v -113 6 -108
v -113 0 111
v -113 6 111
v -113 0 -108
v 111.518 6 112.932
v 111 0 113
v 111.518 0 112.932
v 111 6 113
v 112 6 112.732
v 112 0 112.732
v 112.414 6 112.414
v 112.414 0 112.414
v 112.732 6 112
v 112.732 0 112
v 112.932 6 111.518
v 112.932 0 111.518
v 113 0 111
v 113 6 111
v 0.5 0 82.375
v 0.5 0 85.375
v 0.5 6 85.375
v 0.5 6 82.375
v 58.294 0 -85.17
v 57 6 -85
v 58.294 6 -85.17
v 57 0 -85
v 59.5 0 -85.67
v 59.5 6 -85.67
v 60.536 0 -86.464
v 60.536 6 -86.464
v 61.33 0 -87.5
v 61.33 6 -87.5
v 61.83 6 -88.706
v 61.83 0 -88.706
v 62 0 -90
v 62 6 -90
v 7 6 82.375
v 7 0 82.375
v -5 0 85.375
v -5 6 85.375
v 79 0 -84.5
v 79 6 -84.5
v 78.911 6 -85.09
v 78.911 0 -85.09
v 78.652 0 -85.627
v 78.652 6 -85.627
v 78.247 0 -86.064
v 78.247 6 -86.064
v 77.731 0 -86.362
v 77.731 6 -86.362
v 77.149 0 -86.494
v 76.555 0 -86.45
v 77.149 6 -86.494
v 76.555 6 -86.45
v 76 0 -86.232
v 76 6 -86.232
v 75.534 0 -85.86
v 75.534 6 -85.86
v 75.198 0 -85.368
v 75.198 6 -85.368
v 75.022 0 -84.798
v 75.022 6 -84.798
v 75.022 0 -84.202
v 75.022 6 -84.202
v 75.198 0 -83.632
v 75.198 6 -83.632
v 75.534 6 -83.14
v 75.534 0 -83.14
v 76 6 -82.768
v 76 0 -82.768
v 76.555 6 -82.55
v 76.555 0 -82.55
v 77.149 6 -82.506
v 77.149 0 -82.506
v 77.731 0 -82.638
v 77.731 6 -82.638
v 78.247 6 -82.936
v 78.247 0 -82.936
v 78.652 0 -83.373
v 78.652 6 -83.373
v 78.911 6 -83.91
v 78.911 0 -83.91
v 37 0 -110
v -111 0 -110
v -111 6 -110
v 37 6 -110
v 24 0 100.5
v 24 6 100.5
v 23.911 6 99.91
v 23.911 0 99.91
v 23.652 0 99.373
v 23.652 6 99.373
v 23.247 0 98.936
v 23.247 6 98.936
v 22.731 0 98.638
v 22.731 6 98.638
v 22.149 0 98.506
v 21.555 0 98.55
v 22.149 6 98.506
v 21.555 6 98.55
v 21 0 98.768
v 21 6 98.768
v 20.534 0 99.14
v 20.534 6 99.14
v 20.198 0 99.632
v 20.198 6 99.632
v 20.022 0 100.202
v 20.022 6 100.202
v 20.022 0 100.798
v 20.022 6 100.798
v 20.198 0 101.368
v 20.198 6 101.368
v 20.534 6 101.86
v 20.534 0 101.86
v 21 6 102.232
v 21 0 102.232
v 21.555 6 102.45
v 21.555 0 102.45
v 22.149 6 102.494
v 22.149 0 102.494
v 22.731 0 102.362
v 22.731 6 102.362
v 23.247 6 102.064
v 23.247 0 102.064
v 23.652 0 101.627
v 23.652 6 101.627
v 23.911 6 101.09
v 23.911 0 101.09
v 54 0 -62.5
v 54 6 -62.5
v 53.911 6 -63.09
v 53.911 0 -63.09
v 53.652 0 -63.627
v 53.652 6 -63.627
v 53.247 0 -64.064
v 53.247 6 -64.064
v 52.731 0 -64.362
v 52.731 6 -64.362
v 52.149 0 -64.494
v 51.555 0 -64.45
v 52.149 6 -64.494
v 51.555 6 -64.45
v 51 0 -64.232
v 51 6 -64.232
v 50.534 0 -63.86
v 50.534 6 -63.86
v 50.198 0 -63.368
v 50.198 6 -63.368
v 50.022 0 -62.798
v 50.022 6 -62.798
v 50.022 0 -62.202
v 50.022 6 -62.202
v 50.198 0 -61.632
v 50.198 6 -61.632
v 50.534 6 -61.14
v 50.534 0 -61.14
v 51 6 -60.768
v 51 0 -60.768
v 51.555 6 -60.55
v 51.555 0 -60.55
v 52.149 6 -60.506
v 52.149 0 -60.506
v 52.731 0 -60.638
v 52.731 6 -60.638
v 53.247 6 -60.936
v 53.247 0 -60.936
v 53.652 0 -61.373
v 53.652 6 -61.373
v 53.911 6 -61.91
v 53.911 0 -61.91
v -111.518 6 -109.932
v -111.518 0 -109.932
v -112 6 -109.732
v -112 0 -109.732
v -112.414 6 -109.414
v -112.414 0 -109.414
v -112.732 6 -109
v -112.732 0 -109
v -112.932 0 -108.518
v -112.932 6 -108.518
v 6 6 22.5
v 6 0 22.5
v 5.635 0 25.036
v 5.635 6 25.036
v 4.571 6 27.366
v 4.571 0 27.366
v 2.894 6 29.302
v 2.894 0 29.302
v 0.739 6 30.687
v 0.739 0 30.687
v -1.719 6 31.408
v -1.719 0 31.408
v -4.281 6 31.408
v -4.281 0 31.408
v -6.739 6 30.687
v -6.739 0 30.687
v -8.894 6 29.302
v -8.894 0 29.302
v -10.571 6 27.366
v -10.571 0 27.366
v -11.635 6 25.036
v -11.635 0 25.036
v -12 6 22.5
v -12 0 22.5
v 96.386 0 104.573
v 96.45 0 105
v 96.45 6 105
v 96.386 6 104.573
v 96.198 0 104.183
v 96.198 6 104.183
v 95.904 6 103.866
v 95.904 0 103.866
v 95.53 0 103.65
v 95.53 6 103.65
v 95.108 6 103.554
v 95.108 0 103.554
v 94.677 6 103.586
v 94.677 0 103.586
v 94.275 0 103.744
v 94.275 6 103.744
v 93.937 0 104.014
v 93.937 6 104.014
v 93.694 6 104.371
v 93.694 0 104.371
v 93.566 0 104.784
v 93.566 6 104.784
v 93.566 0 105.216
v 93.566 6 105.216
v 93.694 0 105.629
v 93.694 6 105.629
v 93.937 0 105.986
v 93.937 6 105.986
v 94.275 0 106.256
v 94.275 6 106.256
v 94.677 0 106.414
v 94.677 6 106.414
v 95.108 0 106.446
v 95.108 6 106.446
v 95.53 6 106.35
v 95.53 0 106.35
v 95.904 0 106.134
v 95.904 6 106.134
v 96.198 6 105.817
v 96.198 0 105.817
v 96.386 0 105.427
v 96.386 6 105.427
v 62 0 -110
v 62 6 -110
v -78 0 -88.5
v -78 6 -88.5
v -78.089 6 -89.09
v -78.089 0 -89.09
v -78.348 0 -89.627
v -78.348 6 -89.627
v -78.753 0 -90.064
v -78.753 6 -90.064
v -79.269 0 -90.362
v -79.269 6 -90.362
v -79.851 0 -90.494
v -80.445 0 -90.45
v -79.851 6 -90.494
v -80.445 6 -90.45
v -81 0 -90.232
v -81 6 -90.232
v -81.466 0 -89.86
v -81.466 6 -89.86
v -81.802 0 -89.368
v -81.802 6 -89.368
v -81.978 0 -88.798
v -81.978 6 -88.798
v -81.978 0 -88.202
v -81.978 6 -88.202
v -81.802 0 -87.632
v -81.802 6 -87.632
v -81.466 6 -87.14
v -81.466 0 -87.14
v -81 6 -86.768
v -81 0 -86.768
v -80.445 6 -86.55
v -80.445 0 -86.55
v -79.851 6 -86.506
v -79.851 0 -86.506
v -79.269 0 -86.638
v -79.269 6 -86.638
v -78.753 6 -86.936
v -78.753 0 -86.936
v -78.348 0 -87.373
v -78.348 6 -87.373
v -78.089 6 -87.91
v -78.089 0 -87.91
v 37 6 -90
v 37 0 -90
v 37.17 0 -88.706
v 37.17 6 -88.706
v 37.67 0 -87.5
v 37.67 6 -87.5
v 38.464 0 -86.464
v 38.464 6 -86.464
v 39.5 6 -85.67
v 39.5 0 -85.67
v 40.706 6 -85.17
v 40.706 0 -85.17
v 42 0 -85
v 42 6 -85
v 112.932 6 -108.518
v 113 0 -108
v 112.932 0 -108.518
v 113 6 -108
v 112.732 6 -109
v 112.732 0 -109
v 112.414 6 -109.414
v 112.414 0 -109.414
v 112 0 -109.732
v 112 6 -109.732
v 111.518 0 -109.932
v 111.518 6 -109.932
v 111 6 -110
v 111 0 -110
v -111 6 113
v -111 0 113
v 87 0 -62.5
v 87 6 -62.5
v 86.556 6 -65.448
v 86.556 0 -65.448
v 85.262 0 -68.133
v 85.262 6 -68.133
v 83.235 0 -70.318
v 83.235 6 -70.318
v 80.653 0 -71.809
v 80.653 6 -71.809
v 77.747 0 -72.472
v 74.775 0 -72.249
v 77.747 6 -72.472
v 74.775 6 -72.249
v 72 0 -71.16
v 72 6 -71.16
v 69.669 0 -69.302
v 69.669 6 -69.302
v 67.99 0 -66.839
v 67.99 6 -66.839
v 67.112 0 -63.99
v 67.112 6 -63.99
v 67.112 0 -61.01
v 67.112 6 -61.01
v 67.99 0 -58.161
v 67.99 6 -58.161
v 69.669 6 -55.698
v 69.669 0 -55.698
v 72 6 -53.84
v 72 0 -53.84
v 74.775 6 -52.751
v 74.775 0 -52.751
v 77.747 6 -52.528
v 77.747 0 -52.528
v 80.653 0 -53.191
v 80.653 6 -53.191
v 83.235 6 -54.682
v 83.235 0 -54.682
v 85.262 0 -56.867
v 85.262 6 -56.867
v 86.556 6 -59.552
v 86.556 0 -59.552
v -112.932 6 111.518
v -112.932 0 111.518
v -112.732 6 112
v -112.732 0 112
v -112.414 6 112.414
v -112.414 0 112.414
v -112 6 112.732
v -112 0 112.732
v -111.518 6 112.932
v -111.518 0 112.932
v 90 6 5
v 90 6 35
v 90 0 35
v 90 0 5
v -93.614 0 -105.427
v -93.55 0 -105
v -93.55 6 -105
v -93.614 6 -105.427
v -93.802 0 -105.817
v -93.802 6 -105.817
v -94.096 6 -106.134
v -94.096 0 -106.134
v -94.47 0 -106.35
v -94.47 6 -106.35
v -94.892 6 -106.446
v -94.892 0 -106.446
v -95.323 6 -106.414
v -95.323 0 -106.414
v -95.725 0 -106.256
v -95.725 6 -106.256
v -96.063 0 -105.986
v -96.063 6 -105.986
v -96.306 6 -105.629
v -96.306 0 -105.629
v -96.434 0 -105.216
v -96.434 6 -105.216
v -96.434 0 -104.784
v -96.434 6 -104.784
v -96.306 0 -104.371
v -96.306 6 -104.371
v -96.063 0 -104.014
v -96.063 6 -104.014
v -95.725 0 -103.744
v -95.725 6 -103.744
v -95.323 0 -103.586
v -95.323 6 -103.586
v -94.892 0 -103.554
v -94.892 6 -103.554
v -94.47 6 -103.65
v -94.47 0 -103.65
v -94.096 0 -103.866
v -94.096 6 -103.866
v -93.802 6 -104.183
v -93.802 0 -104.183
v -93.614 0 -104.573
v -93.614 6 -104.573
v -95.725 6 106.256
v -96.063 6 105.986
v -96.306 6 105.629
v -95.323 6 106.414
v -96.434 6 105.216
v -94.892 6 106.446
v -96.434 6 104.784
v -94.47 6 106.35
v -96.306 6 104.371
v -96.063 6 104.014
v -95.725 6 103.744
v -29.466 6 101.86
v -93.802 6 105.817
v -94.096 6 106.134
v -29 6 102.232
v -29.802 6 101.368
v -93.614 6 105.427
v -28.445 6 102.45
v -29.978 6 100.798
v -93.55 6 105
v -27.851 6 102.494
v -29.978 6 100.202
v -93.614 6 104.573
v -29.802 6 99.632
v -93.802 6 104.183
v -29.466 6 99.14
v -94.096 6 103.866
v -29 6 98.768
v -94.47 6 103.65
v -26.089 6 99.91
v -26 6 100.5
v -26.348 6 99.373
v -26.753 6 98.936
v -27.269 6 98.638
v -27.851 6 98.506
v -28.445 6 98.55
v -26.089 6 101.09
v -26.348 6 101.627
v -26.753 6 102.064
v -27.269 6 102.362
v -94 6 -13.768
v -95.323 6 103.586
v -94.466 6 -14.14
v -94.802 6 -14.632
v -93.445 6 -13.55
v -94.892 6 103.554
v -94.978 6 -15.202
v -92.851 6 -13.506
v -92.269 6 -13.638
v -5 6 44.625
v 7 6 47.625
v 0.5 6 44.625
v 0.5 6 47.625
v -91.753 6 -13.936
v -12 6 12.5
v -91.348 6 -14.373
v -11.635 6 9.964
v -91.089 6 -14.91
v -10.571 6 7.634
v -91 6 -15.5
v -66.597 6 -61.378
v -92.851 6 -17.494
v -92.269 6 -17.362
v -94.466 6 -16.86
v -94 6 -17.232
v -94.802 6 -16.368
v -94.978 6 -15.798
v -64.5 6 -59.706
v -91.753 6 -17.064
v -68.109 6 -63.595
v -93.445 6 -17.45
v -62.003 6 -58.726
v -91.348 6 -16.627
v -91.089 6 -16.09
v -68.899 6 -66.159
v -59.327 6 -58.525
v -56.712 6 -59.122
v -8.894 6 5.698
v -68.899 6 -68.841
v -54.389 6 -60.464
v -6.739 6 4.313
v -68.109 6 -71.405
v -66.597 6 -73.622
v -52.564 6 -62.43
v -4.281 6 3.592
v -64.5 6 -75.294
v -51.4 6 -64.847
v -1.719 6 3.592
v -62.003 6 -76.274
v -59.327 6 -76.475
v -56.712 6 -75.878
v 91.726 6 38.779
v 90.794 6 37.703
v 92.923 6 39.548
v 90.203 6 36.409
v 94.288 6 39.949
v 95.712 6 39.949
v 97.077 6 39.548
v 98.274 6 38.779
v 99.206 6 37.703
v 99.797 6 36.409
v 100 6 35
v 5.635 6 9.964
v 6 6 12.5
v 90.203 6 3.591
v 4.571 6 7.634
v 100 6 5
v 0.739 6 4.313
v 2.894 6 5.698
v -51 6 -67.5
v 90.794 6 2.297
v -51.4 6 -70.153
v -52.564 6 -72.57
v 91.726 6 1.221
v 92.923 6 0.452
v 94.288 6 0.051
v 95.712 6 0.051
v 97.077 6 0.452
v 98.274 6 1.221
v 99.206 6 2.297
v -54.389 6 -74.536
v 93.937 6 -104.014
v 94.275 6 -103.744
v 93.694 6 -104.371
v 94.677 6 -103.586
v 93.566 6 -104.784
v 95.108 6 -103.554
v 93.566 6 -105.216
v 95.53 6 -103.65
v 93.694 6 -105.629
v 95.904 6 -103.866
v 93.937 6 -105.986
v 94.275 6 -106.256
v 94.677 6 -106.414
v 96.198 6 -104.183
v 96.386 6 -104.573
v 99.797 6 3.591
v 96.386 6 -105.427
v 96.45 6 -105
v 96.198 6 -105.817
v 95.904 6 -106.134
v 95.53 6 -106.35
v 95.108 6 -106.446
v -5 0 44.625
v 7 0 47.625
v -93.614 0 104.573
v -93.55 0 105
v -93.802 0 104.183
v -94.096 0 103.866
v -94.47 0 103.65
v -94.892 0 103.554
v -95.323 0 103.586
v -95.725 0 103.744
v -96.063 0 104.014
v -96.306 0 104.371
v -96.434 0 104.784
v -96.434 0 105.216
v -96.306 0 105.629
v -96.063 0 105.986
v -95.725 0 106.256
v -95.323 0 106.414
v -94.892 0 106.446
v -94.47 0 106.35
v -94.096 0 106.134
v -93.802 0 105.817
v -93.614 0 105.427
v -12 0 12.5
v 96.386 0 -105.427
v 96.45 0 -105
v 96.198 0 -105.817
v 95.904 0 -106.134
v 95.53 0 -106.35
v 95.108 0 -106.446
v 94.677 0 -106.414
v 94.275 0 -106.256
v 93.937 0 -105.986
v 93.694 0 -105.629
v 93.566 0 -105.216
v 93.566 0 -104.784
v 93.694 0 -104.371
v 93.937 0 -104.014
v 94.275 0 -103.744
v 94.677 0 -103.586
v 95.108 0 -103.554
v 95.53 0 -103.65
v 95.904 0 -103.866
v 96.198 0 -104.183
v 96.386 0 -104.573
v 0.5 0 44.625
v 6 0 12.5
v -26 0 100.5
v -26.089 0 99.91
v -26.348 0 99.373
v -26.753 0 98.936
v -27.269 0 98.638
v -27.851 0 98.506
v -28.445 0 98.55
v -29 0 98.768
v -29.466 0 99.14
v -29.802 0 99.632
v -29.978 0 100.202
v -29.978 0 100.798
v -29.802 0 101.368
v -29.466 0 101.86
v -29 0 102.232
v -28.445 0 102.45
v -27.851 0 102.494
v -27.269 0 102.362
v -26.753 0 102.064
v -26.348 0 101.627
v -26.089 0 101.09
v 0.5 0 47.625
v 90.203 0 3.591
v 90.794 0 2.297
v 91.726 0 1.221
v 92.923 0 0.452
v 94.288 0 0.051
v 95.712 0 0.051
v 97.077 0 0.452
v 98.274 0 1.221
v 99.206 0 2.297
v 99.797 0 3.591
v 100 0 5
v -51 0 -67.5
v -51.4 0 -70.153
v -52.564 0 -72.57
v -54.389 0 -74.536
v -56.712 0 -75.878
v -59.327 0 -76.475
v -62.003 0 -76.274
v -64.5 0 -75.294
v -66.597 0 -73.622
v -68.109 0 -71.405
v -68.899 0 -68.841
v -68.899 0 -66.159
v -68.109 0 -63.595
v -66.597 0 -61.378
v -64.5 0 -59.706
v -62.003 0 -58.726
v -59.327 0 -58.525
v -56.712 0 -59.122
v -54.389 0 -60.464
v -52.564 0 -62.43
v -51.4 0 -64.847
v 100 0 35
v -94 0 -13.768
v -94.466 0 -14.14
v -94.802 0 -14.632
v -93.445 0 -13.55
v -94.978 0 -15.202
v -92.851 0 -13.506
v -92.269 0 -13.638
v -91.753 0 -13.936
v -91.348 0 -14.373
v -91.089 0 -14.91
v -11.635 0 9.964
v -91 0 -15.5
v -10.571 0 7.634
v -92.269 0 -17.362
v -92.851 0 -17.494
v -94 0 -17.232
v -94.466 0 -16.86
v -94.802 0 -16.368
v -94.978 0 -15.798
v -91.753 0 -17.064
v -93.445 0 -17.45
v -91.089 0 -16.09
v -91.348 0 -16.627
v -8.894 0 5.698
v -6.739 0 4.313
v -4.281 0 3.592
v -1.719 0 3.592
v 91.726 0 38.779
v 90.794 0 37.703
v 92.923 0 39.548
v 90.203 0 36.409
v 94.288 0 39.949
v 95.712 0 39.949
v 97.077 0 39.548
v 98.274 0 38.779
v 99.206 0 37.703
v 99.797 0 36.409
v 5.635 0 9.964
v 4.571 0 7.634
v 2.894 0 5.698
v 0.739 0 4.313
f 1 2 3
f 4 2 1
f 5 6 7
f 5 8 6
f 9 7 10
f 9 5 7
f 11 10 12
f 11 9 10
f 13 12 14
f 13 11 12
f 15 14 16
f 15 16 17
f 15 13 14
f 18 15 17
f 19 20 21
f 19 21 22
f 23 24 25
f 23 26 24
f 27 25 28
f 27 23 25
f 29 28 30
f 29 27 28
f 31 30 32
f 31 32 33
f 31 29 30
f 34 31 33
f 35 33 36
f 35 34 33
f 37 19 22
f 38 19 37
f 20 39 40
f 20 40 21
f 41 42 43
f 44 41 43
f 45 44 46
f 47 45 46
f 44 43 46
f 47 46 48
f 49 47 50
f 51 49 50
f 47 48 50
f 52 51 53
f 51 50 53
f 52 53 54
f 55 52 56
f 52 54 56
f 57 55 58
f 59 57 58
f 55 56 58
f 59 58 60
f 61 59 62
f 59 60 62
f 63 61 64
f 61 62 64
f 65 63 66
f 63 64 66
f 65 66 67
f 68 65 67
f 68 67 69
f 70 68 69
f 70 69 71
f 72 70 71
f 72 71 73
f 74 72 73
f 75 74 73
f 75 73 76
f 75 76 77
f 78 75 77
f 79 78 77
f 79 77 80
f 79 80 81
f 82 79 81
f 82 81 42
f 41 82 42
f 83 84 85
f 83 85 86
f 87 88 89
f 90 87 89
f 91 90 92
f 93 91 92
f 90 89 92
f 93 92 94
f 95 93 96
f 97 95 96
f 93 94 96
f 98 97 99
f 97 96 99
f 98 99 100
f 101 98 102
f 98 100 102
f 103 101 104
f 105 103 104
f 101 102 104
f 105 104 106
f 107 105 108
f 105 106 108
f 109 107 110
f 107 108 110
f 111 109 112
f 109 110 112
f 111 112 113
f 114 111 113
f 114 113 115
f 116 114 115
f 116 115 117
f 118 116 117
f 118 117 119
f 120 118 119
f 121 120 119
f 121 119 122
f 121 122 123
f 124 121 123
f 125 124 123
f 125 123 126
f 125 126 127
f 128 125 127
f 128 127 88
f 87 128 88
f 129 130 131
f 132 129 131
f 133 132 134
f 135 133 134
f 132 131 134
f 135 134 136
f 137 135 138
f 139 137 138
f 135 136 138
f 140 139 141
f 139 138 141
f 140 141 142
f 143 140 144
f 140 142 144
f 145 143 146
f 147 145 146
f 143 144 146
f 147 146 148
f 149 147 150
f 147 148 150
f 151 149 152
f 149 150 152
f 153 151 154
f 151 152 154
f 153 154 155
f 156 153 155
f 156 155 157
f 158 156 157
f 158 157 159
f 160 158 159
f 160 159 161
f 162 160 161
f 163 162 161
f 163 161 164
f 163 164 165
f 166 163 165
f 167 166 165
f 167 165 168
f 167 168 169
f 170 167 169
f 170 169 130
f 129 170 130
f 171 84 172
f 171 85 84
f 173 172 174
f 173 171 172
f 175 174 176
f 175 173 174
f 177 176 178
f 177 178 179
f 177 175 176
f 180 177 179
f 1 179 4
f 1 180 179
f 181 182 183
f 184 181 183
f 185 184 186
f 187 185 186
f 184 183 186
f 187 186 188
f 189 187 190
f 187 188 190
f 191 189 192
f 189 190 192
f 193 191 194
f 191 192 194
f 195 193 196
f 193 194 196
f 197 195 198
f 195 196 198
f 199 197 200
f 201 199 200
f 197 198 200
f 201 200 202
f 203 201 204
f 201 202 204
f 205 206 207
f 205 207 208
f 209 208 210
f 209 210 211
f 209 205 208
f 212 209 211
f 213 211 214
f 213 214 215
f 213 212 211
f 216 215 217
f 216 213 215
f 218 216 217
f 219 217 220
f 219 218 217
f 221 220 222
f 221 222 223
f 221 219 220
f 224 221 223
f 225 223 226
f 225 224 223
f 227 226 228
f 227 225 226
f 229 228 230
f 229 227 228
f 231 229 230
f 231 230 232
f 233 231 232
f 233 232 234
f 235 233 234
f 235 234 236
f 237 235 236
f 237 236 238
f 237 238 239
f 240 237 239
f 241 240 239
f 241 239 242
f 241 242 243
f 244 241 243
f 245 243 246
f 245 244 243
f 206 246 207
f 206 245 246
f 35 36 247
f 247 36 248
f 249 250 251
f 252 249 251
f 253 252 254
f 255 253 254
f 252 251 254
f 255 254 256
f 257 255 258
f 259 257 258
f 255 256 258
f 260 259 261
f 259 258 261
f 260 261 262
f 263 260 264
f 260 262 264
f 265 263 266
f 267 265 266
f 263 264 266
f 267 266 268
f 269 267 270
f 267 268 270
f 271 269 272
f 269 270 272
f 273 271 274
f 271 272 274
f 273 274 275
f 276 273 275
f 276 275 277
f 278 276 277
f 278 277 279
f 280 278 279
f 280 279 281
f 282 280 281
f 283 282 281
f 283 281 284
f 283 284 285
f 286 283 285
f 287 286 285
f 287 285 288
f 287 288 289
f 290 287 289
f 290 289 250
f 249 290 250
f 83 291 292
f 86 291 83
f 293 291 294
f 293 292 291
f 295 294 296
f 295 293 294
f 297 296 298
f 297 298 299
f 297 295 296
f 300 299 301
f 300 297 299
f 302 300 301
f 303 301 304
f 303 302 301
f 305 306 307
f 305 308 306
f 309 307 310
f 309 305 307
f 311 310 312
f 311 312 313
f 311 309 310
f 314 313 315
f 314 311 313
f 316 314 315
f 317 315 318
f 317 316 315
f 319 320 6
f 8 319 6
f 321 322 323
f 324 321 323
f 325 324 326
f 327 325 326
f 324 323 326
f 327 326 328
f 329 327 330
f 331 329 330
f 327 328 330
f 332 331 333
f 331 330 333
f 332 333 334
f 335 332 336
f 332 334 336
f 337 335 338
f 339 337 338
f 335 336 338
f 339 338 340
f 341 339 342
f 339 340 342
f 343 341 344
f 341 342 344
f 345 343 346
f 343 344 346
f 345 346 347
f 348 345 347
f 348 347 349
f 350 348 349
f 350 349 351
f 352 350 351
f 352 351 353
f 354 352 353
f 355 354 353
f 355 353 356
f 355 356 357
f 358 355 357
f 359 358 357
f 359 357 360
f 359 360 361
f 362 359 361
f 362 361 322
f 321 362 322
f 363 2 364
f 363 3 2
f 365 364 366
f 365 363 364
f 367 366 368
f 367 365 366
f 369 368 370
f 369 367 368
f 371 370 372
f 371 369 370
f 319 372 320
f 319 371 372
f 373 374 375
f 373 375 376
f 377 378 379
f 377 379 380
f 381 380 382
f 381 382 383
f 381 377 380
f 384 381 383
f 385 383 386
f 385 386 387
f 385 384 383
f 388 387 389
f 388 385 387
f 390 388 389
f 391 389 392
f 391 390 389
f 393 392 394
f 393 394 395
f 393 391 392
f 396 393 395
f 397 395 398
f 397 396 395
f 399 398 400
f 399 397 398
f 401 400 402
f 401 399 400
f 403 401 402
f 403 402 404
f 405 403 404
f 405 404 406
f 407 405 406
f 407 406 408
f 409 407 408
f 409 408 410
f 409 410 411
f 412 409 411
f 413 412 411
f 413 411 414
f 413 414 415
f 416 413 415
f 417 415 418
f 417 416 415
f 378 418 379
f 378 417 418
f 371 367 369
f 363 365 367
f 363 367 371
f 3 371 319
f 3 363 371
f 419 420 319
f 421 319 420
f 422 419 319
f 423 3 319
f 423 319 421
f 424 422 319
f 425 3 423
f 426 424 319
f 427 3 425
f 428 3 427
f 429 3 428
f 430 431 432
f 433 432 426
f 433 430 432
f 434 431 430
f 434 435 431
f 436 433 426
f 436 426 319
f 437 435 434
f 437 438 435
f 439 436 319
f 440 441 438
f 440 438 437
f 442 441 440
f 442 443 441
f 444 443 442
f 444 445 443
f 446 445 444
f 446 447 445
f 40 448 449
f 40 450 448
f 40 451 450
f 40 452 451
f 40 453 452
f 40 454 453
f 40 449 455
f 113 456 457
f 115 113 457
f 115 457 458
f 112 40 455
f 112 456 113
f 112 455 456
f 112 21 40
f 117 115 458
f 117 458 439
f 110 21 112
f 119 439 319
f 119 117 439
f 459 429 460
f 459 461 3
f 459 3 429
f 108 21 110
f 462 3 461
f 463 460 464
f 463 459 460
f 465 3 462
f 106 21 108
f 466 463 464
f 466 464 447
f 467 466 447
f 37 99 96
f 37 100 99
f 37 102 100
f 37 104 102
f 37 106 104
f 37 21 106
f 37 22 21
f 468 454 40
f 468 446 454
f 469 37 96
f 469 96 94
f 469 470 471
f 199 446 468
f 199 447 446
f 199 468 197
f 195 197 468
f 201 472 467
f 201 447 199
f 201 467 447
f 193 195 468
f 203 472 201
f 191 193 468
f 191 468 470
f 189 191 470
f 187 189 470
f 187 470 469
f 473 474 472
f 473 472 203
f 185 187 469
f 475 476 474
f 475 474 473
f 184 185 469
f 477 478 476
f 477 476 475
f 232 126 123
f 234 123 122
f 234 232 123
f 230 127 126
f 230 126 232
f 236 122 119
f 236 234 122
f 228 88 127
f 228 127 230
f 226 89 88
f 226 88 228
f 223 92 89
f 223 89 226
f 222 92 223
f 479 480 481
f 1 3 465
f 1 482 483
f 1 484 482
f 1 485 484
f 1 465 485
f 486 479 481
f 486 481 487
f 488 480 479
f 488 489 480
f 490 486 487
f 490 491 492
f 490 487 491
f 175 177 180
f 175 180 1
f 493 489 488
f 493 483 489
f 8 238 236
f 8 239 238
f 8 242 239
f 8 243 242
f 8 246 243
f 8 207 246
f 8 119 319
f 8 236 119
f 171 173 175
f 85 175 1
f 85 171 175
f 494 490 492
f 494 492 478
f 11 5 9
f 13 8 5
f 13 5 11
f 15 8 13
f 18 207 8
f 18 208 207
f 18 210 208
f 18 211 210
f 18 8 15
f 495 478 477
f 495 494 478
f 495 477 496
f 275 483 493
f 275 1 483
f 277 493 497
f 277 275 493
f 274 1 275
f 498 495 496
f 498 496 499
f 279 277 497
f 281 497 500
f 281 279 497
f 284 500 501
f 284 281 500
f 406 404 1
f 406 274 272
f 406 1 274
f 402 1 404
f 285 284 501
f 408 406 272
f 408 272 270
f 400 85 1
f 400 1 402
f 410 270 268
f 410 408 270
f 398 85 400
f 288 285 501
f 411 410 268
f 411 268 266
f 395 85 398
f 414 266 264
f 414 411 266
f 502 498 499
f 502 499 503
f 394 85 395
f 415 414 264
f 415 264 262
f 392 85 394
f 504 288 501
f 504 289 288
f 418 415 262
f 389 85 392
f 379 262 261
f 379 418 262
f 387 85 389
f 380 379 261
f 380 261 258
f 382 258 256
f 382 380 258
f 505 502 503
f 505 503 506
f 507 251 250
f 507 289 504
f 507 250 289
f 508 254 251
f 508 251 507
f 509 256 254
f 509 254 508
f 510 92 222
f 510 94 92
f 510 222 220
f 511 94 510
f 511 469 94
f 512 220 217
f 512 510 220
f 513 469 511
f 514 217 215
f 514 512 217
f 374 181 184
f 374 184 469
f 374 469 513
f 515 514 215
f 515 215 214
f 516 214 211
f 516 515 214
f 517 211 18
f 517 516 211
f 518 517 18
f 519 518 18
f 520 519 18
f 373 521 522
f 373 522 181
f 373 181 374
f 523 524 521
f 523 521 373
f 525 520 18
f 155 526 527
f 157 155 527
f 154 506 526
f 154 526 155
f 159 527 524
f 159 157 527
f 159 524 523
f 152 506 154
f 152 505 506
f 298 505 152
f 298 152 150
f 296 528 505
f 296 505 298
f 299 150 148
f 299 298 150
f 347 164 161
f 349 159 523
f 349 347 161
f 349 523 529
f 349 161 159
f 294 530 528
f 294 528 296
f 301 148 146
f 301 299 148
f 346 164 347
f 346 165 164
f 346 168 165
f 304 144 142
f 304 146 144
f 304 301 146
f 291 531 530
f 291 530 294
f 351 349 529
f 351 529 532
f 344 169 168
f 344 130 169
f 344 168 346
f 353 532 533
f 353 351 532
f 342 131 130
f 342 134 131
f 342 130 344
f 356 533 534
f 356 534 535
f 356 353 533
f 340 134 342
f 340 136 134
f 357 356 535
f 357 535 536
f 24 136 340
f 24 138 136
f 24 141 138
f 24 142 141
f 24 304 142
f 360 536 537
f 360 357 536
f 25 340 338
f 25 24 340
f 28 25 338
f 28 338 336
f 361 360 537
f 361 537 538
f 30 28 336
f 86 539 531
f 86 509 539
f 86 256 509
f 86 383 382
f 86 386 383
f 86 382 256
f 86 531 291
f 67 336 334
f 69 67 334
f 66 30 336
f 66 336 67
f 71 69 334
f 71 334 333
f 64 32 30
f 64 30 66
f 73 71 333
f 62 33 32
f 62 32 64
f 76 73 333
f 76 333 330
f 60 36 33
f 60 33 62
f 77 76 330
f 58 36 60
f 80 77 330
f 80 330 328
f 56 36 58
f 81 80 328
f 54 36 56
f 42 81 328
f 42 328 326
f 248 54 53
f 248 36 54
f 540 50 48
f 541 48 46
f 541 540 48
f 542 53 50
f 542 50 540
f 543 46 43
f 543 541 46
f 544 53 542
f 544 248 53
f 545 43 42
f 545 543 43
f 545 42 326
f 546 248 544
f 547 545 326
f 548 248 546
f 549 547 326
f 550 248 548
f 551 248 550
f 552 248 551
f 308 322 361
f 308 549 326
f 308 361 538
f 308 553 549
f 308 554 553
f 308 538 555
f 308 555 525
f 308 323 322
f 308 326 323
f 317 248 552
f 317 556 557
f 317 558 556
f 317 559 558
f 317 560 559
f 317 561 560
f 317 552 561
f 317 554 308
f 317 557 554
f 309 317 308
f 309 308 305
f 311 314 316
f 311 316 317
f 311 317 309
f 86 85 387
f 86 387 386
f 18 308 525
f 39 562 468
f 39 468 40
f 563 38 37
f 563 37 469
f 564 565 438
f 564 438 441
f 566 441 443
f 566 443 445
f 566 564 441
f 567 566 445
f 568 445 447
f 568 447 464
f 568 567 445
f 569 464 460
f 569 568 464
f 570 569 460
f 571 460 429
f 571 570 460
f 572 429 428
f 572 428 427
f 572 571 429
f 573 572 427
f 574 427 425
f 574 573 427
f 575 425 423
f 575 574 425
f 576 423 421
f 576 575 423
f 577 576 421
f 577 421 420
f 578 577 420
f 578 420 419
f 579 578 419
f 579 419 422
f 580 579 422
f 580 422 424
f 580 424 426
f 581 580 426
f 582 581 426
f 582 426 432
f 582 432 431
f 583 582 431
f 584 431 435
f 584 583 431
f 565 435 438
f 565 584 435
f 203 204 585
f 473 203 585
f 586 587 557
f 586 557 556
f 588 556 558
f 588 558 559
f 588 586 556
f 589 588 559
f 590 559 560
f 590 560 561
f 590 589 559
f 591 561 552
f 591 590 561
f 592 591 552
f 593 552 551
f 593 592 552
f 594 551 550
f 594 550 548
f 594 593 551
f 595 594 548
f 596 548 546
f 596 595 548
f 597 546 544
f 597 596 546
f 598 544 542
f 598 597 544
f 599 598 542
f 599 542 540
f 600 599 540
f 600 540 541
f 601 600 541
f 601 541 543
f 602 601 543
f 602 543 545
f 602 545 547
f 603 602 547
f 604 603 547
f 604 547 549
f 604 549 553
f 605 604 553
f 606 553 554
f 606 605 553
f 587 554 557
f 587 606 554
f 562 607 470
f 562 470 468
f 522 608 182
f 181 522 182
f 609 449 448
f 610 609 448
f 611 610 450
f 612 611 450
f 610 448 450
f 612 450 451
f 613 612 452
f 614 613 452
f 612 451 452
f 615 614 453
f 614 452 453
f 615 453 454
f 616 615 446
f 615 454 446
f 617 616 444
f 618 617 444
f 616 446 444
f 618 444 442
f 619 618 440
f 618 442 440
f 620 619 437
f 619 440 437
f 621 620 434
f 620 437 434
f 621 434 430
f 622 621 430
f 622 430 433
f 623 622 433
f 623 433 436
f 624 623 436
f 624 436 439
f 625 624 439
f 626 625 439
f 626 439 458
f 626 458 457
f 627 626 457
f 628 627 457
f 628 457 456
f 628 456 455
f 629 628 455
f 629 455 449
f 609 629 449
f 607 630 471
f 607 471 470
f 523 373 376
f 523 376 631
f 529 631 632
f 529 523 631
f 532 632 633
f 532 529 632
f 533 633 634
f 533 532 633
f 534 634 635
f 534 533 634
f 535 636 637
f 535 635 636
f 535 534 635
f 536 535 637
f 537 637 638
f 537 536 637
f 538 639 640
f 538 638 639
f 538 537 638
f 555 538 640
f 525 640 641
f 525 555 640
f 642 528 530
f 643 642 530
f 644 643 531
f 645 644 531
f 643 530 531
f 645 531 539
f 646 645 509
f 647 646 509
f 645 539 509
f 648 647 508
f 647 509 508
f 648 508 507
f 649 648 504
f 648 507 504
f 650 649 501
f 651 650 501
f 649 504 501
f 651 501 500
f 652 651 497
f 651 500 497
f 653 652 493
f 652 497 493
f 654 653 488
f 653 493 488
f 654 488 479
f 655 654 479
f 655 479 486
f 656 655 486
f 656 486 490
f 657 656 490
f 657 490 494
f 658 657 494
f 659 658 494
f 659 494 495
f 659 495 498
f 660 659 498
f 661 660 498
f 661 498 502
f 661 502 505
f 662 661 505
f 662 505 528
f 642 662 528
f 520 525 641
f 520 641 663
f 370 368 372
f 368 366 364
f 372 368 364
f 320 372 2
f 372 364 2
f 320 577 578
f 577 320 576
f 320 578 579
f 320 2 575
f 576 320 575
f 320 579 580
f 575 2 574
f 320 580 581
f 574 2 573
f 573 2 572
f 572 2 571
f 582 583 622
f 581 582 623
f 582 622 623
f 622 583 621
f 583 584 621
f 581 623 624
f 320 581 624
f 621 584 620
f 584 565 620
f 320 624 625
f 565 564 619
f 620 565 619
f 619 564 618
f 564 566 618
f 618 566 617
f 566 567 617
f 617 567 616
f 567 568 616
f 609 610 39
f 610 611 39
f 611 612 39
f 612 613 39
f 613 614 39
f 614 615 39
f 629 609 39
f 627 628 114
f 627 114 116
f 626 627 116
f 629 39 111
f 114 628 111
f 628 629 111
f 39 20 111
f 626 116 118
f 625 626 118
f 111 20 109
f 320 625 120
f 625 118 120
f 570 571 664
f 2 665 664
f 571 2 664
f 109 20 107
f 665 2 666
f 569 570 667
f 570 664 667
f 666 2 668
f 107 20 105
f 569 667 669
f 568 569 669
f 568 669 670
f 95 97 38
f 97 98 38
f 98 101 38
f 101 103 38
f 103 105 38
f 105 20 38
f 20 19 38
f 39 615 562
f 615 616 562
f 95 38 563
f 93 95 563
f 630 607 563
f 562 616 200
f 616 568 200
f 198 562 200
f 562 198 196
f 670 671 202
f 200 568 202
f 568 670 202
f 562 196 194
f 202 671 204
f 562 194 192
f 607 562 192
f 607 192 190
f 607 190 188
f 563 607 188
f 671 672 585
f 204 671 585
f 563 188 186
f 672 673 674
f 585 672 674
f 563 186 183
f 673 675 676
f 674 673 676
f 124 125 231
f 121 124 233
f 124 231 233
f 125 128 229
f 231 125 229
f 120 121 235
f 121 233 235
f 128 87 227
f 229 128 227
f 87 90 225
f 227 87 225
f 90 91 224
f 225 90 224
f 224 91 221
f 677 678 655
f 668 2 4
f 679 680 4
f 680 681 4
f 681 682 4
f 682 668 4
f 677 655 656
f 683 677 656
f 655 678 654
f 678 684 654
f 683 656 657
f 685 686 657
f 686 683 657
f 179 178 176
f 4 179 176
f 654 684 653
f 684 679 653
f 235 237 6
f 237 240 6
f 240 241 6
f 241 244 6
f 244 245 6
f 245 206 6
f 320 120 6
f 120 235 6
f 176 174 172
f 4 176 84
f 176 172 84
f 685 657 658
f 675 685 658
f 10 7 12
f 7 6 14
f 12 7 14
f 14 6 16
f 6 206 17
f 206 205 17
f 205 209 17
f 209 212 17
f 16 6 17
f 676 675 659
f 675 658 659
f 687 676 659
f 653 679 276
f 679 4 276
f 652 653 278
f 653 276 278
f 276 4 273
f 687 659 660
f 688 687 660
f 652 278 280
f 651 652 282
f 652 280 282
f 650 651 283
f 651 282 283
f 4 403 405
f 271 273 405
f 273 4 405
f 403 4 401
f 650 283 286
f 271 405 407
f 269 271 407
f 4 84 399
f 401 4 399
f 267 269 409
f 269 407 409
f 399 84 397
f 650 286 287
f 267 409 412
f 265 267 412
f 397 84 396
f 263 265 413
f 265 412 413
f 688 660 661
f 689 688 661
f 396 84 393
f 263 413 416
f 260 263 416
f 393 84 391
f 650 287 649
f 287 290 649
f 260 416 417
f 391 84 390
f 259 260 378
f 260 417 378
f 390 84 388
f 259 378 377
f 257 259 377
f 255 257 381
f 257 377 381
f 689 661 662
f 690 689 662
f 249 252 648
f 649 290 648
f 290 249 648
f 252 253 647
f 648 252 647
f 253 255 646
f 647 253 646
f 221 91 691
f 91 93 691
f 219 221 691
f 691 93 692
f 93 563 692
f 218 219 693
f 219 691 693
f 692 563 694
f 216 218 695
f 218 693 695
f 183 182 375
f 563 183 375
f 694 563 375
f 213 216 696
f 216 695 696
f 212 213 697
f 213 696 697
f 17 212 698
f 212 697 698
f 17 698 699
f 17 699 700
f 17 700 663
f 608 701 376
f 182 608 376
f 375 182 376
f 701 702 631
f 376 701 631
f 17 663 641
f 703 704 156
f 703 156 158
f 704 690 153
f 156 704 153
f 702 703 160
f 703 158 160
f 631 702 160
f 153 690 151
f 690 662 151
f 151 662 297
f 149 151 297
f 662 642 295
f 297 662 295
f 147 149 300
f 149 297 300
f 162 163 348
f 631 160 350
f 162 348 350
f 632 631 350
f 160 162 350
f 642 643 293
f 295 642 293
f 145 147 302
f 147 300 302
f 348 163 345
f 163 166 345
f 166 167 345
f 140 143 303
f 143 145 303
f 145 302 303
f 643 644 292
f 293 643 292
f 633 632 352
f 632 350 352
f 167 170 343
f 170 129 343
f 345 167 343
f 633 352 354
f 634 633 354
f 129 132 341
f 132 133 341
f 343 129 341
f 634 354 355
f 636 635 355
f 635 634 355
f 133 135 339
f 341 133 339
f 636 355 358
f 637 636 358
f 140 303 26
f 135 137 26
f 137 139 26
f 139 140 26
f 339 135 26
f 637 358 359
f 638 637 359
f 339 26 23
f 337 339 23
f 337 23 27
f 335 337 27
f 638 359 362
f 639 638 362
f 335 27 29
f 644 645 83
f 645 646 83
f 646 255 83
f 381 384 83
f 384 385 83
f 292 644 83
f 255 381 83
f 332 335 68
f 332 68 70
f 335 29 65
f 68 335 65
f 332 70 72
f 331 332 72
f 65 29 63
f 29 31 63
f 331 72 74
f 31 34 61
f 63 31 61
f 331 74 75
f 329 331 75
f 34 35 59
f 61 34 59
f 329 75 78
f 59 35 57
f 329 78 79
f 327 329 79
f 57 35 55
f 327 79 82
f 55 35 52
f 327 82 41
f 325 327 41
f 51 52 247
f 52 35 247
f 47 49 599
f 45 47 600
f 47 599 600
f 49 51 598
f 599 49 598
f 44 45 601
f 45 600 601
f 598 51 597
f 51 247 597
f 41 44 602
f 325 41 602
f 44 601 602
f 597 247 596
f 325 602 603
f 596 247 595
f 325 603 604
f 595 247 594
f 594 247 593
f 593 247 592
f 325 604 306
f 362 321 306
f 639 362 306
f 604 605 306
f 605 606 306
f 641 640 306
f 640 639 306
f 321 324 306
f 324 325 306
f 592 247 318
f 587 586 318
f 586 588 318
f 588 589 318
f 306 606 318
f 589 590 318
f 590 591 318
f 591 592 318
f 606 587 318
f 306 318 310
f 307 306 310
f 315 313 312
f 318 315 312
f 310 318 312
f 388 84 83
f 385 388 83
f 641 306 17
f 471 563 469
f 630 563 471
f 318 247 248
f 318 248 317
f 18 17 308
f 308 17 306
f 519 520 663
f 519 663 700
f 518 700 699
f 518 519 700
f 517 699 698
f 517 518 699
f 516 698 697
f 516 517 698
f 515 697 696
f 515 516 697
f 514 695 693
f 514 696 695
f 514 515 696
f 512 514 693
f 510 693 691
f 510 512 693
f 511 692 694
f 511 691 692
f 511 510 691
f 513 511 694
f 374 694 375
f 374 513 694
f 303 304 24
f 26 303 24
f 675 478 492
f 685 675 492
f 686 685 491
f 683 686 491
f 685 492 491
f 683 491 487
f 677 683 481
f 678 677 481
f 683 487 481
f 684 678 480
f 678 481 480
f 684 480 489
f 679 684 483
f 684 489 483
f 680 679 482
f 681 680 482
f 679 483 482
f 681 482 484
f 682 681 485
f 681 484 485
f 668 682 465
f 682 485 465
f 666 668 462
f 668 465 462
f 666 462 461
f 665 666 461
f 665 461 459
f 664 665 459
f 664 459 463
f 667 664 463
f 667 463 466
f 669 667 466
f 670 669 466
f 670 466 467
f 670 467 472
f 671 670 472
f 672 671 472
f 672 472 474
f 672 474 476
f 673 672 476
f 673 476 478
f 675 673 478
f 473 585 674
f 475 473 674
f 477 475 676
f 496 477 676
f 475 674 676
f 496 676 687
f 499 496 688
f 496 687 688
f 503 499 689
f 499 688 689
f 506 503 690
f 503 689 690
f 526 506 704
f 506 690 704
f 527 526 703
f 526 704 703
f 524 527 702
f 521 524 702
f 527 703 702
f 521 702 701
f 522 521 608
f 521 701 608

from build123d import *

# Parameters (mm, degrees)
SKETCH1_W           = 226
SKETCH1_H           = 223
SKETCH1_R           = 1.45
BOSS_EXTRUDE1_DEPTH = 6
SKETCH2_R           = 2
SKETCH2_R_2         = 9
SKETCH2_R_3         = 10
SKETCH2_W           = 25
SKETCH2_H           = 25
CUT_EXTRUDE1_DEPTH  = 7
FILLET1_R           = 5
FILLET2_R           = 2


with BuildPart() as part:
    # Sketch1 → Boss-Extrude1 (new body)
    with BuildSketch(Plane(origin=(0, 0, 0), x_dir=(1, 0, 0), z_dir=(0, 1, 0))):
        with Locations((0, -1.5)):
            Rectangle(SKETCH1_W, SKETCH1_H)
        with Locations((-95, -105)):
            Circle(SKETCH1_R, mode=Mode.SUBTRACT)
        with Locations((-95, 105)):
            Circle(SKETCH1_R, mode=Mode.SUBTRACT)
        with Locations((95, 105)):
            Circle(SKETCH1_R, mode=Mode.SUBTRACT)
        with Locations((95, -105)):
            Circle(SKETCH1_R, mode=Mode.SUBTRACT)
        Polygon((-5, -85.375), (0.5, -85.375), (0.5, -82.375), (7, -82.375), (7, -47.625), (0.5, -47.625), (0.5, -44.625), (-5, -44.625), align=None, mode=Mode.SUBTRACT)
        with BuildLine():
            Line((6, -12.5), (6, -22.5))
            ThreePointArc((6, -22.5), (-3, -31.5), (-12, -22.5))
            Line((-12, -22.5), (-12, -12.5))
            ThreePointArc((-12, -12.5), (-3, -3.5), (6, -12.5))
        make_face(mode=Mode.SUBTRACT)
    extrude(amount=BOSS_EXTRUDE1_DEPTH)

    # Sketch2 → Cut-Extrude1 (cut, through all)
    with BuildSketch(Plane(origin=(0, 6, 0), x_dir=(1, 0, 0), z_dir=(0, 1, 0))):
        with Locations((-28, -100.5)):
            Circle(SKETCH2_R)
        with Locations((22, -100.5)):
            Circle(SKETCH2_R)
        with Locations((-80, 88.5)):
            Circle(SKETCH2_R)
        with Locations((77, 84.5)):
            Circle(SKETCH2_R)
        with Locations((-93, 15.5)):
            Circle(SKETCH2_R)
        with Locations((52, 62.5)):
            Circle(SKETCH2_R)
        with Locations((-60, 67.5)):
            Circle(SKETCH2_R_2)
        with Locations((77, 62.5)):
            Circle(SKETCH2_R_3)
        with BuildLine():
            Line((90, -35), (90, -5))
            ThreePointArc((90, -5), (95, 0), (100, -5))
            Line((100, -5), (100, -35))
            ThreePointArc((100, -35), (95, -40), (90, -35))
        make_face()
        with Locations((49.5, 97.5)):
            Rectangle(SKETCH2_W, SKETCH2_H)
    extrude(amount=-CUT_EXTRUDE1_DEPTH, mode=Mode.SUBTRACT)

    # Fillet1
    fillet1_edges = [part.edges().sort_by_distance(p)[0] for p in [
        (62, 3, -85),
        (37, 3, -85),
    ]]
    fillet(fillet1_edges, radius=FILLET1_R)

    # Fillet2
    fillet2_edges = [part.edges().sort_by_distance(p)[0] for p in [
        (-113, 3, -110),
        (113, 3, -110),
        (113, 3, 113),
        (-113, 3, 113),
    ]]
    fillet(fillet2_edges, radius=FILLET2_R)


solid = part.part
